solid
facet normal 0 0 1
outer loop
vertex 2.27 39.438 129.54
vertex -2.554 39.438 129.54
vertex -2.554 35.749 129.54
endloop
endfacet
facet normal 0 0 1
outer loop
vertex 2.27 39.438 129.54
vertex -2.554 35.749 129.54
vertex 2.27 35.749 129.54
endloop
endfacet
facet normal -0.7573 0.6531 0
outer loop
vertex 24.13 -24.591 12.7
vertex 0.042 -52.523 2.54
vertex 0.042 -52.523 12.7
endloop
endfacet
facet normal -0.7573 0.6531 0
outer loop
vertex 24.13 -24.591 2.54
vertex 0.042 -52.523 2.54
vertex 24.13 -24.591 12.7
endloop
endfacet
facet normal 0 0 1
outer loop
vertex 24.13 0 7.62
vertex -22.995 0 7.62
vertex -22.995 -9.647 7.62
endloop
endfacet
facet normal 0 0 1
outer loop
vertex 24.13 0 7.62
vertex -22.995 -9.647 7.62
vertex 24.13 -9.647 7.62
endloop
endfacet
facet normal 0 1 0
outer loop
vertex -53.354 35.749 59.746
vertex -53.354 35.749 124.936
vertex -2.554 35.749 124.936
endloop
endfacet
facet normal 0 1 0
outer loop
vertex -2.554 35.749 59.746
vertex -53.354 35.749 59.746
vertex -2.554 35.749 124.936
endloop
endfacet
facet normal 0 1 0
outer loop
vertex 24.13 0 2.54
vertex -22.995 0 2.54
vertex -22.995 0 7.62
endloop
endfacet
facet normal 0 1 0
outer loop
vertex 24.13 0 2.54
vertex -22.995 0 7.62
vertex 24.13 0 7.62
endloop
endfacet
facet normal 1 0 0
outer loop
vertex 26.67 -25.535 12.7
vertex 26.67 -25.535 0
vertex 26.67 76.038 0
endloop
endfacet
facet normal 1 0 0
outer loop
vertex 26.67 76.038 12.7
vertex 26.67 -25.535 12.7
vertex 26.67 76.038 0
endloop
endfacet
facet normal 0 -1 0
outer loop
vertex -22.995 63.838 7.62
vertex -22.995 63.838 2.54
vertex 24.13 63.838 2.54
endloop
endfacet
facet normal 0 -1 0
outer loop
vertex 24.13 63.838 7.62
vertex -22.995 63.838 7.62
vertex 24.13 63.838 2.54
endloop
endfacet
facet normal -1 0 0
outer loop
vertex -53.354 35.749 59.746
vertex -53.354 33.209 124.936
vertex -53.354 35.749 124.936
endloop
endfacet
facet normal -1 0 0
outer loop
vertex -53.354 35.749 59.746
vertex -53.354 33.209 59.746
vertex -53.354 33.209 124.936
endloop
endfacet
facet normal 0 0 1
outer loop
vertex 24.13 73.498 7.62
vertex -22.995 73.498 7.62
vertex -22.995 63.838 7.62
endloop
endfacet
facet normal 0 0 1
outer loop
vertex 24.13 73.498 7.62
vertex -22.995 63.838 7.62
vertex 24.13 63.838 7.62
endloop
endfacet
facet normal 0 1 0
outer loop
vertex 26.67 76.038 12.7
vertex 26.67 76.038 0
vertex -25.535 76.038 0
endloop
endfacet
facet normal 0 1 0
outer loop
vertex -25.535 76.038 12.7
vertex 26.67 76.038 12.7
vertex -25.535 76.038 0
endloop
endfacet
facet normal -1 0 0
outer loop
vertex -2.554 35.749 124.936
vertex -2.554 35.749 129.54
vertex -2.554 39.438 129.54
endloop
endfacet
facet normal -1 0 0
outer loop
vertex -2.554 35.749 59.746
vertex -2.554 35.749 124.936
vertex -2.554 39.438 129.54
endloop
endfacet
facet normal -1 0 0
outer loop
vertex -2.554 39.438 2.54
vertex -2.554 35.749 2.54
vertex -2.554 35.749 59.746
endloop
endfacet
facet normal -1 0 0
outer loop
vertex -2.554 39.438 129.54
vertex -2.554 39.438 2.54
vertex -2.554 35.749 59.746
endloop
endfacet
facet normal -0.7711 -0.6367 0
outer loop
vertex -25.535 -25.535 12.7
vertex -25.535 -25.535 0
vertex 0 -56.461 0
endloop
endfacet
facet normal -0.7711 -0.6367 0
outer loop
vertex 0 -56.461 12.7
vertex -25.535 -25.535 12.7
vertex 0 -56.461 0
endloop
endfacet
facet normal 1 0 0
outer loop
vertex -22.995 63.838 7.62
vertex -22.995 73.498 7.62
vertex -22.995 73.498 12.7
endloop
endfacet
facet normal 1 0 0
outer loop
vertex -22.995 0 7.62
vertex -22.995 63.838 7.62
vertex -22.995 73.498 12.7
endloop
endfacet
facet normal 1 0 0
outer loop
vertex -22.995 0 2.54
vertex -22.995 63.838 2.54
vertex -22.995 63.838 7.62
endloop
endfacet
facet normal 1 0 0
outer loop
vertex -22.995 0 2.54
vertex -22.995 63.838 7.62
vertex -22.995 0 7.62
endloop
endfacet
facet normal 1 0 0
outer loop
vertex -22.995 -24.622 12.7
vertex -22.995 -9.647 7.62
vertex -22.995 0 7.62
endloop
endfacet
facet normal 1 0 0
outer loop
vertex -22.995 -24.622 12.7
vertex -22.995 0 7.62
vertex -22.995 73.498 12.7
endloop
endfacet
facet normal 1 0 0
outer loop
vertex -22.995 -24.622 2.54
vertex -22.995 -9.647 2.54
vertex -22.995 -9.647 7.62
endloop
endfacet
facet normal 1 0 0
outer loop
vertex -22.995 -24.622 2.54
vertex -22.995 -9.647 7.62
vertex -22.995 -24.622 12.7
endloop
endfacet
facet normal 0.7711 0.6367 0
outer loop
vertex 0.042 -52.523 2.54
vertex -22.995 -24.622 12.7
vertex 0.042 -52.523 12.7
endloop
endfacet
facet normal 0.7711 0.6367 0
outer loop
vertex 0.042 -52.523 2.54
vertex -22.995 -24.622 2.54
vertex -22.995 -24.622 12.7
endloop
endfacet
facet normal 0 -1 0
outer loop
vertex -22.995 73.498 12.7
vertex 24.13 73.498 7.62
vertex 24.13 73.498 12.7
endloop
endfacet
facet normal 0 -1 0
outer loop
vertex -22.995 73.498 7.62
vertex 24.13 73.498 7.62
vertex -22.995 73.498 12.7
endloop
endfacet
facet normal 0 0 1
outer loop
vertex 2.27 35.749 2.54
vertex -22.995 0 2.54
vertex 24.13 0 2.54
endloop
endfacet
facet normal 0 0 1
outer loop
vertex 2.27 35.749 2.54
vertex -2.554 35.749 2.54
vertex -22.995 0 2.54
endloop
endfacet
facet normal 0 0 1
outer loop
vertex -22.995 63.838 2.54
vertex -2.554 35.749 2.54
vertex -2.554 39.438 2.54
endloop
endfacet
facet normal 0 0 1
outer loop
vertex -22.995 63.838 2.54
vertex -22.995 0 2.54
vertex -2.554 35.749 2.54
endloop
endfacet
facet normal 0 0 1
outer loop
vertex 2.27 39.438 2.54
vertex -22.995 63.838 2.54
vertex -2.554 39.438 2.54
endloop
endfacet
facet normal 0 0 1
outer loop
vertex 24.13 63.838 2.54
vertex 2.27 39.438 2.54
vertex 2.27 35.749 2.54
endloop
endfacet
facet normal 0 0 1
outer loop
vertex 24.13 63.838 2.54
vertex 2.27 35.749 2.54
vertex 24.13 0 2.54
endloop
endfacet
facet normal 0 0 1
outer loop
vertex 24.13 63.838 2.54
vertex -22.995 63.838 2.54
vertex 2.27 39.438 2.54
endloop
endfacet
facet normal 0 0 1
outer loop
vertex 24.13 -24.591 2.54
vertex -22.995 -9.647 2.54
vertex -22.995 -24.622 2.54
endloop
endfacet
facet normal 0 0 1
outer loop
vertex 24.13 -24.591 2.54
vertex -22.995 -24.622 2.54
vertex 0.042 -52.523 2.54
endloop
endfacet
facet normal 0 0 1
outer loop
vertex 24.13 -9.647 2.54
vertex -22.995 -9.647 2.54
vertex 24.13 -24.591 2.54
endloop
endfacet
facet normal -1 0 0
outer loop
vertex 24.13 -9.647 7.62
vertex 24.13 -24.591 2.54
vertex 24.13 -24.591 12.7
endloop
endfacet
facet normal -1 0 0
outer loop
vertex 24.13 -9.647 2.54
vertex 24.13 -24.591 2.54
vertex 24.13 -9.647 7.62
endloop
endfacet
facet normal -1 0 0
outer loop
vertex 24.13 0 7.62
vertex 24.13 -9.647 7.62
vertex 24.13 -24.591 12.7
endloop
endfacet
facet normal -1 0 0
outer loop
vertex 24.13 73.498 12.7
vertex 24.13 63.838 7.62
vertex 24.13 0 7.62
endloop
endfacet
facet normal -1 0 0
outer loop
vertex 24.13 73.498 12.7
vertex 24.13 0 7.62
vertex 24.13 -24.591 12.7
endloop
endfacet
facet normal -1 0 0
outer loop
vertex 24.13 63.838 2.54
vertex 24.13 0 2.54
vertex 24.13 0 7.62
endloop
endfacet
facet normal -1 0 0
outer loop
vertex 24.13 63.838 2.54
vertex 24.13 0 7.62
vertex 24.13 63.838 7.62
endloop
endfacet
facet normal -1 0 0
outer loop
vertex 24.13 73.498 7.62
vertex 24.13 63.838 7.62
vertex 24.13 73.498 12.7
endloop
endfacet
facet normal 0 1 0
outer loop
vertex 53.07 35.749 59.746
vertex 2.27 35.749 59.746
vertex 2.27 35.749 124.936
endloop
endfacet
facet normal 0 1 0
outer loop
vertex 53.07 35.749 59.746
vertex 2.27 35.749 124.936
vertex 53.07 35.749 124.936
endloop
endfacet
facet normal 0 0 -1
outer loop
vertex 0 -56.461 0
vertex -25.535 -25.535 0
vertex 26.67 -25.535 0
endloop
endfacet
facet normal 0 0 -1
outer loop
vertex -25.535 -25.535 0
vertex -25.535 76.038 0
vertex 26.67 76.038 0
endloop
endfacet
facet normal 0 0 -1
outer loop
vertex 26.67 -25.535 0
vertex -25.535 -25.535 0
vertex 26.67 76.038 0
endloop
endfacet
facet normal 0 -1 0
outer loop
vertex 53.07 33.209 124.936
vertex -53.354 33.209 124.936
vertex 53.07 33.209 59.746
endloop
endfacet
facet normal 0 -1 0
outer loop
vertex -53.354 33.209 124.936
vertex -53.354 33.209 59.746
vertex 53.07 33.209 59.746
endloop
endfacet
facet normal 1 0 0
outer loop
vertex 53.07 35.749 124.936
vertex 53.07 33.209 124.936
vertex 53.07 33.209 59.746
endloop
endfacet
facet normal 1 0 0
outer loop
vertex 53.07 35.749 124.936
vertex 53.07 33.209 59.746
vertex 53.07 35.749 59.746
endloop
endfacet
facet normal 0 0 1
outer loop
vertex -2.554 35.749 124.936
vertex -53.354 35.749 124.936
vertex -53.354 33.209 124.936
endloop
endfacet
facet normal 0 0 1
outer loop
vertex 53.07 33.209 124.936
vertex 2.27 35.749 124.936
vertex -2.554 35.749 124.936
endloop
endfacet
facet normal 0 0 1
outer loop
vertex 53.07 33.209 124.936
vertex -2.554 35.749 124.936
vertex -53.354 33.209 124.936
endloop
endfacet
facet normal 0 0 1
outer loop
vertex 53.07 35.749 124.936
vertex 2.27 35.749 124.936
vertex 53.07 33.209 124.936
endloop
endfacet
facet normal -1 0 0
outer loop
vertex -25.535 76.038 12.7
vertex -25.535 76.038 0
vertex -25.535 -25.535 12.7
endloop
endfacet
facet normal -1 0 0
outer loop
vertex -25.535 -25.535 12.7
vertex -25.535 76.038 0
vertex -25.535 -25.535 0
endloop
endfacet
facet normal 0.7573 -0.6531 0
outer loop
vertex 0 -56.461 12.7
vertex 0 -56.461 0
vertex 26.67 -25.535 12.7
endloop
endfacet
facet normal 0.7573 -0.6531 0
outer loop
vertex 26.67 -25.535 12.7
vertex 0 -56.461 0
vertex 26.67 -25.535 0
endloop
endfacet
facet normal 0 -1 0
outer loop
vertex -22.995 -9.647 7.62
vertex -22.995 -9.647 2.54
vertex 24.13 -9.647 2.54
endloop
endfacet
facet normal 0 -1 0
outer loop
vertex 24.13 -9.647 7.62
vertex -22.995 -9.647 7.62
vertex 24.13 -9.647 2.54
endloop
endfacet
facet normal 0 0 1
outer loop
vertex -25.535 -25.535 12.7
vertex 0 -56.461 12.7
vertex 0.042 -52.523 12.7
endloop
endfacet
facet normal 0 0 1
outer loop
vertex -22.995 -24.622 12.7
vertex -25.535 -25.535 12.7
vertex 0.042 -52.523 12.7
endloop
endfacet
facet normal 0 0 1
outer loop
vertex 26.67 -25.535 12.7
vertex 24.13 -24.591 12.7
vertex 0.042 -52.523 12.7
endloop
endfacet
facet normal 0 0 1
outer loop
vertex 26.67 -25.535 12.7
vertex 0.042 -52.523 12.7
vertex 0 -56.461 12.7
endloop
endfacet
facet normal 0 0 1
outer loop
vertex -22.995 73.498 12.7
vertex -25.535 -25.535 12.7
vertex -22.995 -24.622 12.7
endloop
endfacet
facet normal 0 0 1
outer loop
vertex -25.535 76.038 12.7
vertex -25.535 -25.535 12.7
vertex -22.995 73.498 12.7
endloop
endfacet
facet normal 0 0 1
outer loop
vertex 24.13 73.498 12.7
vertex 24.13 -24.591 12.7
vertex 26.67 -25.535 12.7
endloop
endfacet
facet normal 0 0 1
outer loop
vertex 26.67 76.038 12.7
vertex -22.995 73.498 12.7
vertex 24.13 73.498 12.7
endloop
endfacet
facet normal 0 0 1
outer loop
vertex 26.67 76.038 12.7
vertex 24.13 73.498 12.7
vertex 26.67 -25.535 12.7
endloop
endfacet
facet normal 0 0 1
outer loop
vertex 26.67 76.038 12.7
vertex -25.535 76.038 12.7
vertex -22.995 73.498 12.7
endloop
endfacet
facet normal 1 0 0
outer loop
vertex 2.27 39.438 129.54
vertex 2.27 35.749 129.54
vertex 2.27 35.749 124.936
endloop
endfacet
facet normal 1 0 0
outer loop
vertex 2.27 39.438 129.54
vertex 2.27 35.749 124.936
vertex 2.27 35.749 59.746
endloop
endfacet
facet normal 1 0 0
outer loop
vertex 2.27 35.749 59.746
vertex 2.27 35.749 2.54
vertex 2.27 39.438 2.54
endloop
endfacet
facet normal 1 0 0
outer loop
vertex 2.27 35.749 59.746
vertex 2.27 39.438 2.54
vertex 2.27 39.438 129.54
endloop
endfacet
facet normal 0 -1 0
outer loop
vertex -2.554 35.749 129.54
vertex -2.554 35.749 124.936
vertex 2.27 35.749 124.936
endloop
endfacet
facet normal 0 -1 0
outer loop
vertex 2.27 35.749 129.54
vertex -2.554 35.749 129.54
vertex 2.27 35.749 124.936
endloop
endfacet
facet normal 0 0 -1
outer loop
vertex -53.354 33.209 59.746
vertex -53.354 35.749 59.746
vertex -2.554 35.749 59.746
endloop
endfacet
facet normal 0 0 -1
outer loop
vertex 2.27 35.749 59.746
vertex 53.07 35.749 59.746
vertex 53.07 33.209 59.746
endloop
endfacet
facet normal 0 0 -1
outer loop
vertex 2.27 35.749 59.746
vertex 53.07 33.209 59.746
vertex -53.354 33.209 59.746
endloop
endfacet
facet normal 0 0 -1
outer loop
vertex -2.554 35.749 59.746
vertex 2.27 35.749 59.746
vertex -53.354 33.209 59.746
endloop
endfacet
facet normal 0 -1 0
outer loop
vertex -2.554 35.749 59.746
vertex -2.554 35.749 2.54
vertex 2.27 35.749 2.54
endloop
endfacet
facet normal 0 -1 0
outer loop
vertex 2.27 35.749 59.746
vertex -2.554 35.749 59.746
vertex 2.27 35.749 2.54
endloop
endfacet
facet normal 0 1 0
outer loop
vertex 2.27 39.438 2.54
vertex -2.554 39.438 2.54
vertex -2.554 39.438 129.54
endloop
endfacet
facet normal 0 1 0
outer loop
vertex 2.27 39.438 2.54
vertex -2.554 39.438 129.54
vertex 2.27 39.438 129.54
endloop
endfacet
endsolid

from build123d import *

# Parameters (mm, degrees)
F0_W      = 25.5351066589
F0_H      = 25.5351066589
F0_H_2    = 76.037876308
F0_W_2    = 26.6699995846
F1_DEPTH  = 12.7
F2_T      = -2.54
F3_W      = 47.1251062435
F3_H      = 9.6601096606
F3_H_2    = 9.6465954557
F4_DEPTH  = 5.08
F5_W      = 4.8232972622
F5_H      = 3.6884061992
F6_DEPTH  = 127
F7_W      = 4.8232972622
F7_H      = 2.9607340693
F8_DEPTH  = 2.54
F9_W      = 2.54
F9_H      = 2.9607340693
F10_DEPTH = 50.8
F11_W     = 2.54
F11_H     = 2.9607340693
F12_DEPTH = 50.8
F13_W     = 106.4232972622
F13_H     = 2.54
F14_DEPTH = 62.23


with BuildPart() as f1:
    # F0 (on Top) → F1 (new body)
    with BuildSketch(Plane.XY):
        with Locations((-12.7675533295, -12.7675533295)):
            Rectangle(F0_W, F0_H)
        with Locations((-12.7675533295, 38.018938154)):
            Rectangle(F0_W, F0_H_2)
        with Locations((13.3349997923, 38.018938154)):
            Rectangle(F0_W_2, F0_H_2)
        with Locations((13.3349997923, -12.7675533295)):
            Rectangle(F0_W_2, F0_H)
        Polygon((26.6699995846, -25.5351066589), (0, -25.5351066589), (-25.5351066589, -25.5351066589), (0, -56.4609579742), align=None)
    extrude(amount=F1_DEPTH)

    # F2
    f2_openings = [f1.faces().sort_by_distance(p)[0] for p in [
        (0.542456, 17.179425, 12.7),
    ]]
    offset(amount=F2_T, openings=f2_openings)

    # F3 (on face) → F4 (join)
    with BuildSketch(Plane.XY.offset(2.54)):
        with Locations((0.5674464628, 68.6678214777)):
            Rectangle(F3_W, F3_H)
        with Locations((0.5674464628, -4.8232977279)):
            Rectangle(F3_W, F3_H_2)
    extrude(amount=F4_DEPTH)

    # F5 (on face) → F6 (join)
    with BuildSketch(Plane.XY.offset(2.54)):
        with Locations((-0.1418609172, 37.5933516771)):
            Rectangle(F5_W, F5_H)
    extrude(amount=F6_DEPTH)

    # F7 (on face) → F8 (join)
    with BuildSketch(Plane.XZ.offset(-35.7491485775)):
        with Locations((-0.1418609172, 61.2260736525)):
            Rectangle(F7_W, F7_H)
    extrude(amount=F8_DEPTH)

    # F9 (on face) → F10 (join)
    with BuildSketch(Plane.YZ.offset(2.2697877139)):
        with Locations((34.4791485775, 61.2260736525)):
            Rectangle(F9_W, F9_H)
    extrude(amount=F10_DEPTH)

    # F11 (on face) → F12 (join)
    with BuildSketch(Plane(origin=(-2.5535095483, 0, 0), x_dir=(0, -1, 0), z_dir=(-1, 0, 0))):
        with Locations((-34.4791485775, 61.2260736525)):
            Rectangle(F11_W, F11_H)
    extrude(amount=F12_DEPTH)

    # F13 (on face) → F14 (join)
    with BuildSketch(Plane.XY.offset(62.7064406872)):
        with Locations((-0.1418609172, 34.4791485775)):
            Rectangle(F13_W, F13_H)
    extrude(amount=F14_DEPTH)


solid = f1.part
